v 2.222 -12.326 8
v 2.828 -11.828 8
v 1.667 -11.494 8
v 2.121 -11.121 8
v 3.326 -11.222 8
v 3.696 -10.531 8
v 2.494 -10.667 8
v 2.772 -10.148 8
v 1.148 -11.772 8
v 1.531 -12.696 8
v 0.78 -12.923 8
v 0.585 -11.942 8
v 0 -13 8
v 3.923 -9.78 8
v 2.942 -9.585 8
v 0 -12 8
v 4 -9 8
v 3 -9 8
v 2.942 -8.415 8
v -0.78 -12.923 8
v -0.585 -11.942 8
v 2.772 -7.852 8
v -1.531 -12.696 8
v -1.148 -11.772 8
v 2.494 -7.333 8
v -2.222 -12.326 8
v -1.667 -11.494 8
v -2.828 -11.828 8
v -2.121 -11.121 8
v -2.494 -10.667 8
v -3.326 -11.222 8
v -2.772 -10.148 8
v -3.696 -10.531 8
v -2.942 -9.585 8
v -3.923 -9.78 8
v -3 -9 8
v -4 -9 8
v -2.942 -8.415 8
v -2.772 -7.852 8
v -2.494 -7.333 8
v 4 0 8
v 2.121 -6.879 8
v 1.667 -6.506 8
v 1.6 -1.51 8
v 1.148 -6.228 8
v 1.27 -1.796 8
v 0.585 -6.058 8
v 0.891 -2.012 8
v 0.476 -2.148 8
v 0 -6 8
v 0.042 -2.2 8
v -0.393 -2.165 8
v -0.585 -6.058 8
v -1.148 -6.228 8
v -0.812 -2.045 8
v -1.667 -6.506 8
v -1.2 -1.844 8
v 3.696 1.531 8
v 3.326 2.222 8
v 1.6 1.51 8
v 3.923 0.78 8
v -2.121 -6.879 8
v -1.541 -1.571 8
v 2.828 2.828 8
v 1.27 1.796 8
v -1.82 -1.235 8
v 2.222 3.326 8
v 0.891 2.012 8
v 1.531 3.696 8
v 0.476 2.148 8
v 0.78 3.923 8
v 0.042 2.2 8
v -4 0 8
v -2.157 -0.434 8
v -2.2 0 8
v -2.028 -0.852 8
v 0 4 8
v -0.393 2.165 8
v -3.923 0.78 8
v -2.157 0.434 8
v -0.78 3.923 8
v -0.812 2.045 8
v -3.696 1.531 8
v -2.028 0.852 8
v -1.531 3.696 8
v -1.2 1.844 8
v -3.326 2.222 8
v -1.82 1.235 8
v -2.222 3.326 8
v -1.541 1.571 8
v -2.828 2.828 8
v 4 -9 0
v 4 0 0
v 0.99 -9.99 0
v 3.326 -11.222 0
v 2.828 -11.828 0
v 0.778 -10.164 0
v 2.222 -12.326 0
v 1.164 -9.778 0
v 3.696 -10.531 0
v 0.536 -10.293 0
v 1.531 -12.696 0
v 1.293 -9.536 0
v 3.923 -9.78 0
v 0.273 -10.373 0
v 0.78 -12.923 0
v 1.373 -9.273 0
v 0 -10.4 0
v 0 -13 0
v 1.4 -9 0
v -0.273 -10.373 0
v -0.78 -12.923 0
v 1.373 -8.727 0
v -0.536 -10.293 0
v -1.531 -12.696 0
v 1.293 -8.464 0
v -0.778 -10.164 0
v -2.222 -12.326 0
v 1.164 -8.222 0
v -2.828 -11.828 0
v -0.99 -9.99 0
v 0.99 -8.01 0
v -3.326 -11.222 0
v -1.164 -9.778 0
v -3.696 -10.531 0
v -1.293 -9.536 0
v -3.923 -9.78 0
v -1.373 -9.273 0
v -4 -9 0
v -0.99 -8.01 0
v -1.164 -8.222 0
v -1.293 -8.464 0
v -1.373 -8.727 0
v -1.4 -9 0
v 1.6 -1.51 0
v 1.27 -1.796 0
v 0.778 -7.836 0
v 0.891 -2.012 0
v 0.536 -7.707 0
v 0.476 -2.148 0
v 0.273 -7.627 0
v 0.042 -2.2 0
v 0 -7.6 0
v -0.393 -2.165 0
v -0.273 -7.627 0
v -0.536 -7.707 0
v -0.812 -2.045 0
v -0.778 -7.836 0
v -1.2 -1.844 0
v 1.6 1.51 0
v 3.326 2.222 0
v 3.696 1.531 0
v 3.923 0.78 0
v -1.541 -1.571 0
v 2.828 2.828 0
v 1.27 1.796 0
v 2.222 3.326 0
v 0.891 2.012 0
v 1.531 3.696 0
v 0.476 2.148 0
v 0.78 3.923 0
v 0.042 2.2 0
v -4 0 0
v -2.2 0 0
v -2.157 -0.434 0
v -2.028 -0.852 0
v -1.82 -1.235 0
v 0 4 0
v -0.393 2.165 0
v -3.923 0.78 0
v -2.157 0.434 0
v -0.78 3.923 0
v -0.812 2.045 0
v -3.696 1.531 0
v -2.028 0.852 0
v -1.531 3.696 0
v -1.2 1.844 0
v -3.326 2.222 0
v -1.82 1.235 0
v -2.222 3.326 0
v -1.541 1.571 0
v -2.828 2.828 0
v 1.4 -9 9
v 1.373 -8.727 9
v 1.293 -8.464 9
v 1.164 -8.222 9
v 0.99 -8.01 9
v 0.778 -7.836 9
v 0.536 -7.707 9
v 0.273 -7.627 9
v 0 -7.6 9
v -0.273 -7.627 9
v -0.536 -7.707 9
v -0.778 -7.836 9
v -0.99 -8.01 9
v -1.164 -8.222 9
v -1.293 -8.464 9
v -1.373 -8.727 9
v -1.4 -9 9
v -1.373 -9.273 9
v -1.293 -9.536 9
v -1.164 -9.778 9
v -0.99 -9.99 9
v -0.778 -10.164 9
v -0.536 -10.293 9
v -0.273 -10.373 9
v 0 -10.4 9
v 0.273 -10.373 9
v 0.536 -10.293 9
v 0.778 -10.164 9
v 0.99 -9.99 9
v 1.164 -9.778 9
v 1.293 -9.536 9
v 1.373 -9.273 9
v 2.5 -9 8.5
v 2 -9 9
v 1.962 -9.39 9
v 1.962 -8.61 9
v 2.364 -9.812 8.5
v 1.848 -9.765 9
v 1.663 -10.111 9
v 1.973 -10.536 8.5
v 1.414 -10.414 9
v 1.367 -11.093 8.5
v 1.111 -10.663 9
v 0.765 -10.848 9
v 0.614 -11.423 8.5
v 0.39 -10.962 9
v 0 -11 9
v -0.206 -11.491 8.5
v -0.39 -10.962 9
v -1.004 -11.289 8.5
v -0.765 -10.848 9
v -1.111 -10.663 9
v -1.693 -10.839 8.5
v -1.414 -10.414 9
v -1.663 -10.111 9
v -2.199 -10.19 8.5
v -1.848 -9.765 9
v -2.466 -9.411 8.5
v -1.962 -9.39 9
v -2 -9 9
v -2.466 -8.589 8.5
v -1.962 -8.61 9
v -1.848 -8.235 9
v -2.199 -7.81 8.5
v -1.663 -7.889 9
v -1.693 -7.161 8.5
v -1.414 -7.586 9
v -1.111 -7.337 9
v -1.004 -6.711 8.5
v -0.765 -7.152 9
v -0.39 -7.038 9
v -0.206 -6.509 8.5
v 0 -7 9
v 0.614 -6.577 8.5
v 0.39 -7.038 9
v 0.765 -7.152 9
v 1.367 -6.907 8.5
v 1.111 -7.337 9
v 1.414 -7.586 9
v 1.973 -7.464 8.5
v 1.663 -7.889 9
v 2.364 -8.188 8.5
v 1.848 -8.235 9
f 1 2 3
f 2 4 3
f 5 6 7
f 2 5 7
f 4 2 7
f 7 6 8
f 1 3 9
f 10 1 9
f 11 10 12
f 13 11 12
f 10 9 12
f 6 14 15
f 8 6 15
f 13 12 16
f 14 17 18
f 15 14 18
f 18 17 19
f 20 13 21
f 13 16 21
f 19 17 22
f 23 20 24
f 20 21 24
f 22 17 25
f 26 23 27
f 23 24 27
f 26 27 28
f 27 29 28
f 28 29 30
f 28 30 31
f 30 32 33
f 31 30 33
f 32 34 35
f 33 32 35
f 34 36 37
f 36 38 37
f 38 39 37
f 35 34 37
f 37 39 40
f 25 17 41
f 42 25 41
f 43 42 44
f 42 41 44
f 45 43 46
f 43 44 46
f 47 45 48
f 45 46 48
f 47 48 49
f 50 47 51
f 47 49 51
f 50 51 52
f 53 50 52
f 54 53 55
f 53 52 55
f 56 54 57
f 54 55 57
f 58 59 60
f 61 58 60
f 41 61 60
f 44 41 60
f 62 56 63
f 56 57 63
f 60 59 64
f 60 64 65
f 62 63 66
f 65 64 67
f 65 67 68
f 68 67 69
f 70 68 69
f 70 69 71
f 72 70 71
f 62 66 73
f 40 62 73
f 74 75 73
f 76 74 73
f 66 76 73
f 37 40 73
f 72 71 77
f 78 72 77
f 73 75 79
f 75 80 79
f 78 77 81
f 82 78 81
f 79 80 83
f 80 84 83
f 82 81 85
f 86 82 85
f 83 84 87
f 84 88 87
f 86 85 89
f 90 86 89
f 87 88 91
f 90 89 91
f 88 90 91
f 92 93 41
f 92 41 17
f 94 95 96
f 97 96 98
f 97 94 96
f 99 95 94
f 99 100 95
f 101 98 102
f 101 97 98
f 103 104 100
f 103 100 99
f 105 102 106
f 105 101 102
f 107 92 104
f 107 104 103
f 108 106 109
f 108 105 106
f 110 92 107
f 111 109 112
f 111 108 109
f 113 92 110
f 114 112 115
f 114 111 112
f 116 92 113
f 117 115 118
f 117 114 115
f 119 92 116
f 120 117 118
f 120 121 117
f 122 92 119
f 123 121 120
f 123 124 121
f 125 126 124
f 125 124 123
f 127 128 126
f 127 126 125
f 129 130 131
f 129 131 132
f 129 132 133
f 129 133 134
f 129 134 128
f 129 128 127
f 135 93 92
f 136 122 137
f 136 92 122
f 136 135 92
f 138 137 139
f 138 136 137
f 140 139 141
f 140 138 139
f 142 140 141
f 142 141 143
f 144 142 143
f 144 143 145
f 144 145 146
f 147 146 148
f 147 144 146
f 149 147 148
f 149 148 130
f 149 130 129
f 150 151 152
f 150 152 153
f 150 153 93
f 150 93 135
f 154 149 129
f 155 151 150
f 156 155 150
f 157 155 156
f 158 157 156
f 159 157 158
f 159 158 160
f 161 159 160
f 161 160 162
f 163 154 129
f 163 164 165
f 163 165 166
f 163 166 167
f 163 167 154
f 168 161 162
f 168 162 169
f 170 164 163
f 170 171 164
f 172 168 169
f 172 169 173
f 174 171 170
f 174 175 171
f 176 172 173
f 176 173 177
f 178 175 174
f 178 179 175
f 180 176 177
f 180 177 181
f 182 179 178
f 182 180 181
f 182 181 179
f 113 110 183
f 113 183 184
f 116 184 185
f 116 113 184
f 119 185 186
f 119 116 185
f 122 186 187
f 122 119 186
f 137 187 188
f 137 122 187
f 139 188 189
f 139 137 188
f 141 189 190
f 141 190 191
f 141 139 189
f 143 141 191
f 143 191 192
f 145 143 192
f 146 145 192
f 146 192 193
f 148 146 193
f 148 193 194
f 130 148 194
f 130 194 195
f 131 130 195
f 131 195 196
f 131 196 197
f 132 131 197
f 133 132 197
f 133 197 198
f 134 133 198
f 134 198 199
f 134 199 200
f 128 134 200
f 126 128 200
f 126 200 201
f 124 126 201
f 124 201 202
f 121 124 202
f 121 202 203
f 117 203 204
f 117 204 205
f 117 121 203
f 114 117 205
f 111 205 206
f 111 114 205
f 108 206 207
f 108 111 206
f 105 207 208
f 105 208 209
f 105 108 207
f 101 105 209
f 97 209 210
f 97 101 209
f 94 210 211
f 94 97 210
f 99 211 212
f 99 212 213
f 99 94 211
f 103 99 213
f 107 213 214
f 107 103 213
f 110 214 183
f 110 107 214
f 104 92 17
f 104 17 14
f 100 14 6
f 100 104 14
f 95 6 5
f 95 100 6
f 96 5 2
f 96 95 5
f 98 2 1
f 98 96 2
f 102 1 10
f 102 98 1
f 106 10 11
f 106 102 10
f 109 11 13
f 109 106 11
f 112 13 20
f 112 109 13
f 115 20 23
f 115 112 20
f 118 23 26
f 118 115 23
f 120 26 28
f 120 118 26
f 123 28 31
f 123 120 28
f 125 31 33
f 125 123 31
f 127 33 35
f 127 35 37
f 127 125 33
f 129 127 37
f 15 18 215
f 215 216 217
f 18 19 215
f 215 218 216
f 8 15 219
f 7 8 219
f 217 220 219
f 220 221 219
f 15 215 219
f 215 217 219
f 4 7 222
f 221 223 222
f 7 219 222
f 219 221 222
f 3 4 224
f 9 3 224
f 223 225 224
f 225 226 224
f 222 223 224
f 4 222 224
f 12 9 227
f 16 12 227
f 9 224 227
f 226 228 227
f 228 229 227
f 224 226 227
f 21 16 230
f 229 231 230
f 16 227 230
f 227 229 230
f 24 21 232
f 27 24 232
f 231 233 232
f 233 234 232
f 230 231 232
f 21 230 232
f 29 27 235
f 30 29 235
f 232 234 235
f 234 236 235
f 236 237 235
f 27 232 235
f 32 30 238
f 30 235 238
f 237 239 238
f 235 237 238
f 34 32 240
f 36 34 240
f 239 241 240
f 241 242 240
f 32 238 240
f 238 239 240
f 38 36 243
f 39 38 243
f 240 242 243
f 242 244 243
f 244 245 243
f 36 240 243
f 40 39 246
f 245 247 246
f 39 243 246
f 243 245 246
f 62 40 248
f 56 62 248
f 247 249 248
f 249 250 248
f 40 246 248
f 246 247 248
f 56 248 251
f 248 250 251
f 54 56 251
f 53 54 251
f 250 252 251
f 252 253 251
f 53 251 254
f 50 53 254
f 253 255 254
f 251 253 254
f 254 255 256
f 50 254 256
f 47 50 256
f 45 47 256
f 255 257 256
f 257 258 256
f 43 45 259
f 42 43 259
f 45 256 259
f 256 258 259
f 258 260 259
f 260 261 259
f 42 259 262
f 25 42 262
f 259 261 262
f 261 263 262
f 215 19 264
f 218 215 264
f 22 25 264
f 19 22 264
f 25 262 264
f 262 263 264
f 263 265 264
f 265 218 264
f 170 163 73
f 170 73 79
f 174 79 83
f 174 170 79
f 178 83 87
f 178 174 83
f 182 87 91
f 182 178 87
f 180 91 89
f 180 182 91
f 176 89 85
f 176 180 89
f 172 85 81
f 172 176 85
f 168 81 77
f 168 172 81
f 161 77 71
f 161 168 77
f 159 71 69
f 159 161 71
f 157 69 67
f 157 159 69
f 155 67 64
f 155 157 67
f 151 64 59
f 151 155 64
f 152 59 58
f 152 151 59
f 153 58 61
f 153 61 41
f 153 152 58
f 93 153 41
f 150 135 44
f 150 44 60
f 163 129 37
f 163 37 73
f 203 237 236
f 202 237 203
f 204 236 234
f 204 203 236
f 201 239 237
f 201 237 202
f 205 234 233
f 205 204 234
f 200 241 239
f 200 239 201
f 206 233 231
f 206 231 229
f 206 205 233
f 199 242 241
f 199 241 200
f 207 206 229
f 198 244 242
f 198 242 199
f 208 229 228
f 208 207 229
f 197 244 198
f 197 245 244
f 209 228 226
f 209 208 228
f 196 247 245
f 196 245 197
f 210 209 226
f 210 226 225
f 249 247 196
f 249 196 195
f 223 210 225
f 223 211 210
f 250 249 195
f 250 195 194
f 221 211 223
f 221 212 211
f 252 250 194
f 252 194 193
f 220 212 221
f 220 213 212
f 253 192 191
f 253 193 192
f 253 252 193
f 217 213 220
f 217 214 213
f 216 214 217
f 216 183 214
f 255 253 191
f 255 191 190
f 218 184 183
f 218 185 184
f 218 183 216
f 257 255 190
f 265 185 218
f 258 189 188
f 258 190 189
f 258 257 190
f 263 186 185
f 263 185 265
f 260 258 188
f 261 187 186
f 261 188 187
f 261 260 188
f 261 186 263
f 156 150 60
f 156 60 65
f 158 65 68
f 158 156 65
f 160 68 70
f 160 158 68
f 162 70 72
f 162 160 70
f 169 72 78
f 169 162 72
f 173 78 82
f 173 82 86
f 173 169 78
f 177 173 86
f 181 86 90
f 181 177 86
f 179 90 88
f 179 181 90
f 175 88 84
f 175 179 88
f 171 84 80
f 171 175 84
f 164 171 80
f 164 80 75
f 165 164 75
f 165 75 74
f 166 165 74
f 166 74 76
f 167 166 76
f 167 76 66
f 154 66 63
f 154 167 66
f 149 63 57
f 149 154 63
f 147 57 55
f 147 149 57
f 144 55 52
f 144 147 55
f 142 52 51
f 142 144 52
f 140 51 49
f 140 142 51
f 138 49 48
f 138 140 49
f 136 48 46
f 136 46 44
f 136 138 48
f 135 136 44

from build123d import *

# Parameters (mm, degrees)
EXTRUDE_2_DEPTH     = 8
SKETCH_1_6_R        = 1.4
CUT_EXTRUDE_2_DEPTH = 8
SKETCH_1_8_R        = 2
SKETCH_1_8_R_2      = 1.4
EXTRUDE_3_DEPTH     = 9
CHAMFER_2_SIZE      = 1


with BuildPart() as part:
    # 草图1 → 凸台-拉伸2 (new body)
    with BuildSketch(Plane.XY):
        with BuildLine():
            Line((4, 0), (4, -9))
            ThreePointArc((4, -9), (0, -13), (-4, -9))
            Line((-4, -9), (-4, 0))
            ThreePointArc((-4, 0), (0, 4), (4, 0))
        make_face()
    extrude(amount=EXTRUDE_2_DEPTH)

    # 草图1<6> → 切除-拉伸2 (cut)
    with BuildSketch(Plane.XY):
        with BuildLine():
            Line((1.6, -1.509966887), (1.6, 1.509966887))
            ThreePointArc((1.6, 1.509966887), (-2.2, 0), (1.6, -1.509966887))
        make_face()
        with Locations((0, -9)):
            Circle(SKETCH_1_6_R)
    extrude(amount=CUT_EXTRUDE_2_DEPTH, mode=Mode.SUBTRACT)

    # 草图1<8> → 凸台-拉伸3 (add)
    with BuildSketch(Plane.XY):
        with Locations((0, -9)):
            Circle(SKETCH_1_8_R)
        with Locations((0, -9)):
            Circle(SKETCH_1_8_R_2, mode=Mode.SUBTRACT)
    extrude(amount=EXTRUDE_3_DEPTH)

    # 倒角2
    chamfer_2_edges = [part.edges().sort_by_distance(p)[0] for p in [
        (-2, -9, 8),
    ]]
    chamfer(chamfer_2_edges, length=CHAMFER_2_SIZE - 0.0001)  # a hair under: the kernel refuses the full size


solid = part.part
